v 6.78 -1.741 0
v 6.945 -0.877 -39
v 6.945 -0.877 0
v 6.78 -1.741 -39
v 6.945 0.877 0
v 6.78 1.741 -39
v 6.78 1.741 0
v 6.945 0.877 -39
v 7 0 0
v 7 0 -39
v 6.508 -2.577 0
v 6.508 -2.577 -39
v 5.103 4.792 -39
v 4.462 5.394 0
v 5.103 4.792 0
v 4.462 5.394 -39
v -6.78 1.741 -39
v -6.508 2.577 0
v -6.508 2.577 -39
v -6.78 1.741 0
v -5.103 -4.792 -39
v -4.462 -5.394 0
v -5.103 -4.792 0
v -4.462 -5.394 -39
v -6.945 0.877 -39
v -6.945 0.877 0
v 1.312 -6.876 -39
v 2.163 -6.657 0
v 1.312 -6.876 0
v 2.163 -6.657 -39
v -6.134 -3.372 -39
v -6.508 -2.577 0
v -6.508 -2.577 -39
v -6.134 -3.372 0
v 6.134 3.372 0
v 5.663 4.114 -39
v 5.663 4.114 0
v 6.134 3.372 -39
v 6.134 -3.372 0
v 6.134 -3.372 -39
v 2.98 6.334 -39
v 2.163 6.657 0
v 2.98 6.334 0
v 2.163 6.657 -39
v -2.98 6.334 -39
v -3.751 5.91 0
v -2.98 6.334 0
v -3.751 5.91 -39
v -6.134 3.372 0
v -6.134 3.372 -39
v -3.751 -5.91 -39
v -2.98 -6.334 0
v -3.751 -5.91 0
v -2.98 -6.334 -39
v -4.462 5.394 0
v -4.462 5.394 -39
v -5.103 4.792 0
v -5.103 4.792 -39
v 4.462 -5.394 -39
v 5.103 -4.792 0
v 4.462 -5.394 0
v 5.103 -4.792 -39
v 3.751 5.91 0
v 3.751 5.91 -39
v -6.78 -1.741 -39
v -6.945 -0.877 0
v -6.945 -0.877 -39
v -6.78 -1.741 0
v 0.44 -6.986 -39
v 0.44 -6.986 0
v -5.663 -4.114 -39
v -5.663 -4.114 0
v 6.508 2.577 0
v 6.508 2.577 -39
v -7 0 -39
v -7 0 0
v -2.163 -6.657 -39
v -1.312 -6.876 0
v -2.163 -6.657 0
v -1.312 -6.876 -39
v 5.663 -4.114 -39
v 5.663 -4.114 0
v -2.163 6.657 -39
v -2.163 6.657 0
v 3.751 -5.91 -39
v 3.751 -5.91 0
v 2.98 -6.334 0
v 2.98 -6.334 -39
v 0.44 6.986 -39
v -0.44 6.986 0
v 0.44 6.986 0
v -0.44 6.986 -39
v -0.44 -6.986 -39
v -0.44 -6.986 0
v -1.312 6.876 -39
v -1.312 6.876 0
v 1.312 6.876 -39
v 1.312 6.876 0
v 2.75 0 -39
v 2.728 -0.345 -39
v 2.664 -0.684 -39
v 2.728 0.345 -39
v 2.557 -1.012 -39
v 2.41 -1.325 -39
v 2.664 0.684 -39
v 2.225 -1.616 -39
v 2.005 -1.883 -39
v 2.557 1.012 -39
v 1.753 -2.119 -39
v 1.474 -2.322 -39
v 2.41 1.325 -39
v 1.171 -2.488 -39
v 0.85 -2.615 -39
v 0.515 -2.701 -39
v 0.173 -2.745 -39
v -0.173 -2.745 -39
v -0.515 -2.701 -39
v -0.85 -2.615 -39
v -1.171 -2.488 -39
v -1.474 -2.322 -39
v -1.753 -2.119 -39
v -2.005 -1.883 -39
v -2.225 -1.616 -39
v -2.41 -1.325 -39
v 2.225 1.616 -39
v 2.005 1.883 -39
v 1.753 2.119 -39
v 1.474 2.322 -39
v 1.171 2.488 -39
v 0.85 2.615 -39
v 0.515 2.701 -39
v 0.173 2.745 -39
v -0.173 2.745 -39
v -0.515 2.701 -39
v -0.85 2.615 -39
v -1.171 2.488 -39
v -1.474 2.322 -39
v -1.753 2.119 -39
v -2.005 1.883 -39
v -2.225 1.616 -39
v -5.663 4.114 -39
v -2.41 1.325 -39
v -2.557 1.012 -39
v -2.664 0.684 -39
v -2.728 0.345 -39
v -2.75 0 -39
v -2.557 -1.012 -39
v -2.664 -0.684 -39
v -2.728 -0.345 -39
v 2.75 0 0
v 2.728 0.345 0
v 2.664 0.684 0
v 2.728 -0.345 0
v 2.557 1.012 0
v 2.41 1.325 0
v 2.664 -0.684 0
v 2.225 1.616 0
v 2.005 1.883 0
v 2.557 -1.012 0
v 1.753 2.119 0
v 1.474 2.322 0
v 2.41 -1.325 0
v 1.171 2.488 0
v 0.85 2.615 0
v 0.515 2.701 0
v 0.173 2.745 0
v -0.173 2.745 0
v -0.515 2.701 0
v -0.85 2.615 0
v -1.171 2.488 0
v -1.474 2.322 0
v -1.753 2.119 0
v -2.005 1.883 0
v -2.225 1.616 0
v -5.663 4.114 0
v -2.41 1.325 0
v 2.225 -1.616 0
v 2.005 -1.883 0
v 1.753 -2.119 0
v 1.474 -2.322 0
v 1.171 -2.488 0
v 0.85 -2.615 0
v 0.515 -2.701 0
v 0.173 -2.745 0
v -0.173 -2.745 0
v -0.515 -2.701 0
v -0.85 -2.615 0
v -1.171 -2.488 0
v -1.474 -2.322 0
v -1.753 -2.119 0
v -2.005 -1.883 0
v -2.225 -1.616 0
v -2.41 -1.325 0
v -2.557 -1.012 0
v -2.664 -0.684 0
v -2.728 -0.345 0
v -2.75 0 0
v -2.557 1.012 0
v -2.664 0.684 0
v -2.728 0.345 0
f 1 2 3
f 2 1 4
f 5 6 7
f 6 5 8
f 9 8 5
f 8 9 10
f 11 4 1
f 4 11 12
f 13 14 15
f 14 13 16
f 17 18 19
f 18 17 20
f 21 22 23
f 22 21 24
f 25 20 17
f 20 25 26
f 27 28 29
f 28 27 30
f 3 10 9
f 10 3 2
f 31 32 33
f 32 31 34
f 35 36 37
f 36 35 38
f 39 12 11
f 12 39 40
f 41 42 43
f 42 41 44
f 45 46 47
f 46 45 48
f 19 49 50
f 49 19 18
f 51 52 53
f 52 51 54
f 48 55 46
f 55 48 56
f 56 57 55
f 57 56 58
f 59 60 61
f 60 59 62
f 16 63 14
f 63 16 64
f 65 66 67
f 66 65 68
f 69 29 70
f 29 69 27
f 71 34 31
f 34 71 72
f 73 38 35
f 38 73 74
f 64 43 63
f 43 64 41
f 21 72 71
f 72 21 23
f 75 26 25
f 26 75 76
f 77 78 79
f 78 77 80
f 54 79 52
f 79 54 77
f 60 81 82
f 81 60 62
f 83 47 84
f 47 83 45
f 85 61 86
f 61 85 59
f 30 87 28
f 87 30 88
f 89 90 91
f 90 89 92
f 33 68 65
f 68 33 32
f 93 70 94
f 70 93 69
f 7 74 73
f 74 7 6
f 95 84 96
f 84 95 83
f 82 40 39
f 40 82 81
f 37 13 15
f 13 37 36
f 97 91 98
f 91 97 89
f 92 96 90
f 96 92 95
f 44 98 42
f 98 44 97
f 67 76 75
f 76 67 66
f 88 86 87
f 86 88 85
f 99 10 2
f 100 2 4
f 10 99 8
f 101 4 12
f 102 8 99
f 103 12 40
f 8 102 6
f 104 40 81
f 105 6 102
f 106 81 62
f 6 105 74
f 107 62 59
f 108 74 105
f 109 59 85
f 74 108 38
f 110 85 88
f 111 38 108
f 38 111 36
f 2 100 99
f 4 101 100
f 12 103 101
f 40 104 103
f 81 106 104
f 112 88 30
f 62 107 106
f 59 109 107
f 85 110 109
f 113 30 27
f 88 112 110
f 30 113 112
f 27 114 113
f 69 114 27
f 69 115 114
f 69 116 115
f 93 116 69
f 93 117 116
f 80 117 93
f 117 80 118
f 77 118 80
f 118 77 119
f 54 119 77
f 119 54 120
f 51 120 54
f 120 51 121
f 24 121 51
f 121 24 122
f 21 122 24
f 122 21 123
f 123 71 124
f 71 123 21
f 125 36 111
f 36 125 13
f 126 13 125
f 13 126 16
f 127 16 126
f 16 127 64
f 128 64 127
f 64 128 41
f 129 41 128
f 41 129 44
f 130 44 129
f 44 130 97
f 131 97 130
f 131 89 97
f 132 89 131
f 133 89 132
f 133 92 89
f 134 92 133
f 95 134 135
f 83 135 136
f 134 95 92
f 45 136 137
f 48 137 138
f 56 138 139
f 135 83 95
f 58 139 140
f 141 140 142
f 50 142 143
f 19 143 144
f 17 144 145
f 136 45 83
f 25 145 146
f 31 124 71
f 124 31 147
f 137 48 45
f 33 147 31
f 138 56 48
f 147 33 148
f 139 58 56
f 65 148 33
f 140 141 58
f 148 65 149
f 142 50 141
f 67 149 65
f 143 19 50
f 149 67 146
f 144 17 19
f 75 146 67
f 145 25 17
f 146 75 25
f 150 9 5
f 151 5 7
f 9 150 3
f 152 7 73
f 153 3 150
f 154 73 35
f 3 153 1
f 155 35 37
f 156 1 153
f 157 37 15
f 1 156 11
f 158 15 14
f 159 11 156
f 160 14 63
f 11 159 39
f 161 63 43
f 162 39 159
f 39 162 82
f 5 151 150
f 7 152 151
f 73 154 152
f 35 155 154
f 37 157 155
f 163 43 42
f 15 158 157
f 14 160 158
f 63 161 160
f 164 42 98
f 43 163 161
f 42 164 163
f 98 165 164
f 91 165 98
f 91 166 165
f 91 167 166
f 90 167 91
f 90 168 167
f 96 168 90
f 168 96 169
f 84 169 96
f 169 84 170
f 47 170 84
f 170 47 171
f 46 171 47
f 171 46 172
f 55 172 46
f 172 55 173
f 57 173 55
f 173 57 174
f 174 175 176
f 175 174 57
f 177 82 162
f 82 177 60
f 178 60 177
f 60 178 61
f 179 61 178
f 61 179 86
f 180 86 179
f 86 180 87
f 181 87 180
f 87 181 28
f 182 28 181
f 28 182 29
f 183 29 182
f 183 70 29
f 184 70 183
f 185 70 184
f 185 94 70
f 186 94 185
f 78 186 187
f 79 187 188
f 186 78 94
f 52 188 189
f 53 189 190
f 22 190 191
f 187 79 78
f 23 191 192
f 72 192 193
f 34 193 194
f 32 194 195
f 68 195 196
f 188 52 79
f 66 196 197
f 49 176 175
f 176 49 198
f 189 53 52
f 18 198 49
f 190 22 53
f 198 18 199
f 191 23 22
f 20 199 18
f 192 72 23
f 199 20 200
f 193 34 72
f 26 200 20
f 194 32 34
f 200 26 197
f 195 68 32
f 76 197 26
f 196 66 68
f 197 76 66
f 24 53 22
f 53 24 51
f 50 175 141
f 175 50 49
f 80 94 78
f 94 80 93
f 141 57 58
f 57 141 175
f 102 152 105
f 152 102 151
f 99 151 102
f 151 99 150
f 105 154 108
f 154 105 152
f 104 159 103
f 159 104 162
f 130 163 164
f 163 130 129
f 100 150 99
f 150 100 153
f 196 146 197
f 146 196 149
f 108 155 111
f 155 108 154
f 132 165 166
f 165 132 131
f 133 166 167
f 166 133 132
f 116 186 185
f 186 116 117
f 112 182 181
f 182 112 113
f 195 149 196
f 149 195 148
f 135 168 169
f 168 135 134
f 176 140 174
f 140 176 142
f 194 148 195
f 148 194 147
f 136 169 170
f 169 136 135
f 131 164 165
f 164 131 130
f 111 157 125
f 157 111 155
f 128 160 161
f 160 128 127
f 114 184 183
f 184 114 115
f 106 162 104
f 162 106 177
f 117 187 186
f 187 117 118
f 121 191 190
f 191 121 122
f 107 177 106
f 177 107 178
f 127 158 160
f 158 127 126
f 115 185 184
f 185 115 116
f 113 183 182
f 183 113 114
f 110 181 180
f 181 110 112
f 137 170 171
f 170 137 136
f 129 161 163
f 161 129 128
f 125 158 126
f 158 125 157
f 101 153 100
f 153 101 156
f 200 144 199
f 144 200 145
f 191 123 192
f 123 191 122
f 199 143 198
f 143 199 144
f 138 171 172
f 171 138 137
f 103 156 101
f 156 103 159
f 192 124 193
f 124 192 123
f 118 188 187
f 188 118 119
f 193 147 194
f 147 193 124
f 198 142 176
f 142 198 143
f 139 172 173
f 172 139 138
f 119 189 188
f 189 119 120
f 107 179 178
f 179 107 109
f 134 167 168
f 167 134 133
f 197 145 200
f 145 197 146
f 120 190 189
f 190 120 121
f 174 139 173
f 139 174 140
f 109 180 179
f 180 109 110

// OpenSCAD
$fn = 50;


difference() {
	union() {
		translate(v = [0, 0, -39.0000000000]) {
			cylinder(h = 39, r = 7.0000000000);
		}
		cylinder(h = 0, r = 10.0000000000);
	}
	union() {
		#translate(v = [0, 0, -39]) {
			cylinder(h = 39, r = 2.7500000000);
		}
	}
}
